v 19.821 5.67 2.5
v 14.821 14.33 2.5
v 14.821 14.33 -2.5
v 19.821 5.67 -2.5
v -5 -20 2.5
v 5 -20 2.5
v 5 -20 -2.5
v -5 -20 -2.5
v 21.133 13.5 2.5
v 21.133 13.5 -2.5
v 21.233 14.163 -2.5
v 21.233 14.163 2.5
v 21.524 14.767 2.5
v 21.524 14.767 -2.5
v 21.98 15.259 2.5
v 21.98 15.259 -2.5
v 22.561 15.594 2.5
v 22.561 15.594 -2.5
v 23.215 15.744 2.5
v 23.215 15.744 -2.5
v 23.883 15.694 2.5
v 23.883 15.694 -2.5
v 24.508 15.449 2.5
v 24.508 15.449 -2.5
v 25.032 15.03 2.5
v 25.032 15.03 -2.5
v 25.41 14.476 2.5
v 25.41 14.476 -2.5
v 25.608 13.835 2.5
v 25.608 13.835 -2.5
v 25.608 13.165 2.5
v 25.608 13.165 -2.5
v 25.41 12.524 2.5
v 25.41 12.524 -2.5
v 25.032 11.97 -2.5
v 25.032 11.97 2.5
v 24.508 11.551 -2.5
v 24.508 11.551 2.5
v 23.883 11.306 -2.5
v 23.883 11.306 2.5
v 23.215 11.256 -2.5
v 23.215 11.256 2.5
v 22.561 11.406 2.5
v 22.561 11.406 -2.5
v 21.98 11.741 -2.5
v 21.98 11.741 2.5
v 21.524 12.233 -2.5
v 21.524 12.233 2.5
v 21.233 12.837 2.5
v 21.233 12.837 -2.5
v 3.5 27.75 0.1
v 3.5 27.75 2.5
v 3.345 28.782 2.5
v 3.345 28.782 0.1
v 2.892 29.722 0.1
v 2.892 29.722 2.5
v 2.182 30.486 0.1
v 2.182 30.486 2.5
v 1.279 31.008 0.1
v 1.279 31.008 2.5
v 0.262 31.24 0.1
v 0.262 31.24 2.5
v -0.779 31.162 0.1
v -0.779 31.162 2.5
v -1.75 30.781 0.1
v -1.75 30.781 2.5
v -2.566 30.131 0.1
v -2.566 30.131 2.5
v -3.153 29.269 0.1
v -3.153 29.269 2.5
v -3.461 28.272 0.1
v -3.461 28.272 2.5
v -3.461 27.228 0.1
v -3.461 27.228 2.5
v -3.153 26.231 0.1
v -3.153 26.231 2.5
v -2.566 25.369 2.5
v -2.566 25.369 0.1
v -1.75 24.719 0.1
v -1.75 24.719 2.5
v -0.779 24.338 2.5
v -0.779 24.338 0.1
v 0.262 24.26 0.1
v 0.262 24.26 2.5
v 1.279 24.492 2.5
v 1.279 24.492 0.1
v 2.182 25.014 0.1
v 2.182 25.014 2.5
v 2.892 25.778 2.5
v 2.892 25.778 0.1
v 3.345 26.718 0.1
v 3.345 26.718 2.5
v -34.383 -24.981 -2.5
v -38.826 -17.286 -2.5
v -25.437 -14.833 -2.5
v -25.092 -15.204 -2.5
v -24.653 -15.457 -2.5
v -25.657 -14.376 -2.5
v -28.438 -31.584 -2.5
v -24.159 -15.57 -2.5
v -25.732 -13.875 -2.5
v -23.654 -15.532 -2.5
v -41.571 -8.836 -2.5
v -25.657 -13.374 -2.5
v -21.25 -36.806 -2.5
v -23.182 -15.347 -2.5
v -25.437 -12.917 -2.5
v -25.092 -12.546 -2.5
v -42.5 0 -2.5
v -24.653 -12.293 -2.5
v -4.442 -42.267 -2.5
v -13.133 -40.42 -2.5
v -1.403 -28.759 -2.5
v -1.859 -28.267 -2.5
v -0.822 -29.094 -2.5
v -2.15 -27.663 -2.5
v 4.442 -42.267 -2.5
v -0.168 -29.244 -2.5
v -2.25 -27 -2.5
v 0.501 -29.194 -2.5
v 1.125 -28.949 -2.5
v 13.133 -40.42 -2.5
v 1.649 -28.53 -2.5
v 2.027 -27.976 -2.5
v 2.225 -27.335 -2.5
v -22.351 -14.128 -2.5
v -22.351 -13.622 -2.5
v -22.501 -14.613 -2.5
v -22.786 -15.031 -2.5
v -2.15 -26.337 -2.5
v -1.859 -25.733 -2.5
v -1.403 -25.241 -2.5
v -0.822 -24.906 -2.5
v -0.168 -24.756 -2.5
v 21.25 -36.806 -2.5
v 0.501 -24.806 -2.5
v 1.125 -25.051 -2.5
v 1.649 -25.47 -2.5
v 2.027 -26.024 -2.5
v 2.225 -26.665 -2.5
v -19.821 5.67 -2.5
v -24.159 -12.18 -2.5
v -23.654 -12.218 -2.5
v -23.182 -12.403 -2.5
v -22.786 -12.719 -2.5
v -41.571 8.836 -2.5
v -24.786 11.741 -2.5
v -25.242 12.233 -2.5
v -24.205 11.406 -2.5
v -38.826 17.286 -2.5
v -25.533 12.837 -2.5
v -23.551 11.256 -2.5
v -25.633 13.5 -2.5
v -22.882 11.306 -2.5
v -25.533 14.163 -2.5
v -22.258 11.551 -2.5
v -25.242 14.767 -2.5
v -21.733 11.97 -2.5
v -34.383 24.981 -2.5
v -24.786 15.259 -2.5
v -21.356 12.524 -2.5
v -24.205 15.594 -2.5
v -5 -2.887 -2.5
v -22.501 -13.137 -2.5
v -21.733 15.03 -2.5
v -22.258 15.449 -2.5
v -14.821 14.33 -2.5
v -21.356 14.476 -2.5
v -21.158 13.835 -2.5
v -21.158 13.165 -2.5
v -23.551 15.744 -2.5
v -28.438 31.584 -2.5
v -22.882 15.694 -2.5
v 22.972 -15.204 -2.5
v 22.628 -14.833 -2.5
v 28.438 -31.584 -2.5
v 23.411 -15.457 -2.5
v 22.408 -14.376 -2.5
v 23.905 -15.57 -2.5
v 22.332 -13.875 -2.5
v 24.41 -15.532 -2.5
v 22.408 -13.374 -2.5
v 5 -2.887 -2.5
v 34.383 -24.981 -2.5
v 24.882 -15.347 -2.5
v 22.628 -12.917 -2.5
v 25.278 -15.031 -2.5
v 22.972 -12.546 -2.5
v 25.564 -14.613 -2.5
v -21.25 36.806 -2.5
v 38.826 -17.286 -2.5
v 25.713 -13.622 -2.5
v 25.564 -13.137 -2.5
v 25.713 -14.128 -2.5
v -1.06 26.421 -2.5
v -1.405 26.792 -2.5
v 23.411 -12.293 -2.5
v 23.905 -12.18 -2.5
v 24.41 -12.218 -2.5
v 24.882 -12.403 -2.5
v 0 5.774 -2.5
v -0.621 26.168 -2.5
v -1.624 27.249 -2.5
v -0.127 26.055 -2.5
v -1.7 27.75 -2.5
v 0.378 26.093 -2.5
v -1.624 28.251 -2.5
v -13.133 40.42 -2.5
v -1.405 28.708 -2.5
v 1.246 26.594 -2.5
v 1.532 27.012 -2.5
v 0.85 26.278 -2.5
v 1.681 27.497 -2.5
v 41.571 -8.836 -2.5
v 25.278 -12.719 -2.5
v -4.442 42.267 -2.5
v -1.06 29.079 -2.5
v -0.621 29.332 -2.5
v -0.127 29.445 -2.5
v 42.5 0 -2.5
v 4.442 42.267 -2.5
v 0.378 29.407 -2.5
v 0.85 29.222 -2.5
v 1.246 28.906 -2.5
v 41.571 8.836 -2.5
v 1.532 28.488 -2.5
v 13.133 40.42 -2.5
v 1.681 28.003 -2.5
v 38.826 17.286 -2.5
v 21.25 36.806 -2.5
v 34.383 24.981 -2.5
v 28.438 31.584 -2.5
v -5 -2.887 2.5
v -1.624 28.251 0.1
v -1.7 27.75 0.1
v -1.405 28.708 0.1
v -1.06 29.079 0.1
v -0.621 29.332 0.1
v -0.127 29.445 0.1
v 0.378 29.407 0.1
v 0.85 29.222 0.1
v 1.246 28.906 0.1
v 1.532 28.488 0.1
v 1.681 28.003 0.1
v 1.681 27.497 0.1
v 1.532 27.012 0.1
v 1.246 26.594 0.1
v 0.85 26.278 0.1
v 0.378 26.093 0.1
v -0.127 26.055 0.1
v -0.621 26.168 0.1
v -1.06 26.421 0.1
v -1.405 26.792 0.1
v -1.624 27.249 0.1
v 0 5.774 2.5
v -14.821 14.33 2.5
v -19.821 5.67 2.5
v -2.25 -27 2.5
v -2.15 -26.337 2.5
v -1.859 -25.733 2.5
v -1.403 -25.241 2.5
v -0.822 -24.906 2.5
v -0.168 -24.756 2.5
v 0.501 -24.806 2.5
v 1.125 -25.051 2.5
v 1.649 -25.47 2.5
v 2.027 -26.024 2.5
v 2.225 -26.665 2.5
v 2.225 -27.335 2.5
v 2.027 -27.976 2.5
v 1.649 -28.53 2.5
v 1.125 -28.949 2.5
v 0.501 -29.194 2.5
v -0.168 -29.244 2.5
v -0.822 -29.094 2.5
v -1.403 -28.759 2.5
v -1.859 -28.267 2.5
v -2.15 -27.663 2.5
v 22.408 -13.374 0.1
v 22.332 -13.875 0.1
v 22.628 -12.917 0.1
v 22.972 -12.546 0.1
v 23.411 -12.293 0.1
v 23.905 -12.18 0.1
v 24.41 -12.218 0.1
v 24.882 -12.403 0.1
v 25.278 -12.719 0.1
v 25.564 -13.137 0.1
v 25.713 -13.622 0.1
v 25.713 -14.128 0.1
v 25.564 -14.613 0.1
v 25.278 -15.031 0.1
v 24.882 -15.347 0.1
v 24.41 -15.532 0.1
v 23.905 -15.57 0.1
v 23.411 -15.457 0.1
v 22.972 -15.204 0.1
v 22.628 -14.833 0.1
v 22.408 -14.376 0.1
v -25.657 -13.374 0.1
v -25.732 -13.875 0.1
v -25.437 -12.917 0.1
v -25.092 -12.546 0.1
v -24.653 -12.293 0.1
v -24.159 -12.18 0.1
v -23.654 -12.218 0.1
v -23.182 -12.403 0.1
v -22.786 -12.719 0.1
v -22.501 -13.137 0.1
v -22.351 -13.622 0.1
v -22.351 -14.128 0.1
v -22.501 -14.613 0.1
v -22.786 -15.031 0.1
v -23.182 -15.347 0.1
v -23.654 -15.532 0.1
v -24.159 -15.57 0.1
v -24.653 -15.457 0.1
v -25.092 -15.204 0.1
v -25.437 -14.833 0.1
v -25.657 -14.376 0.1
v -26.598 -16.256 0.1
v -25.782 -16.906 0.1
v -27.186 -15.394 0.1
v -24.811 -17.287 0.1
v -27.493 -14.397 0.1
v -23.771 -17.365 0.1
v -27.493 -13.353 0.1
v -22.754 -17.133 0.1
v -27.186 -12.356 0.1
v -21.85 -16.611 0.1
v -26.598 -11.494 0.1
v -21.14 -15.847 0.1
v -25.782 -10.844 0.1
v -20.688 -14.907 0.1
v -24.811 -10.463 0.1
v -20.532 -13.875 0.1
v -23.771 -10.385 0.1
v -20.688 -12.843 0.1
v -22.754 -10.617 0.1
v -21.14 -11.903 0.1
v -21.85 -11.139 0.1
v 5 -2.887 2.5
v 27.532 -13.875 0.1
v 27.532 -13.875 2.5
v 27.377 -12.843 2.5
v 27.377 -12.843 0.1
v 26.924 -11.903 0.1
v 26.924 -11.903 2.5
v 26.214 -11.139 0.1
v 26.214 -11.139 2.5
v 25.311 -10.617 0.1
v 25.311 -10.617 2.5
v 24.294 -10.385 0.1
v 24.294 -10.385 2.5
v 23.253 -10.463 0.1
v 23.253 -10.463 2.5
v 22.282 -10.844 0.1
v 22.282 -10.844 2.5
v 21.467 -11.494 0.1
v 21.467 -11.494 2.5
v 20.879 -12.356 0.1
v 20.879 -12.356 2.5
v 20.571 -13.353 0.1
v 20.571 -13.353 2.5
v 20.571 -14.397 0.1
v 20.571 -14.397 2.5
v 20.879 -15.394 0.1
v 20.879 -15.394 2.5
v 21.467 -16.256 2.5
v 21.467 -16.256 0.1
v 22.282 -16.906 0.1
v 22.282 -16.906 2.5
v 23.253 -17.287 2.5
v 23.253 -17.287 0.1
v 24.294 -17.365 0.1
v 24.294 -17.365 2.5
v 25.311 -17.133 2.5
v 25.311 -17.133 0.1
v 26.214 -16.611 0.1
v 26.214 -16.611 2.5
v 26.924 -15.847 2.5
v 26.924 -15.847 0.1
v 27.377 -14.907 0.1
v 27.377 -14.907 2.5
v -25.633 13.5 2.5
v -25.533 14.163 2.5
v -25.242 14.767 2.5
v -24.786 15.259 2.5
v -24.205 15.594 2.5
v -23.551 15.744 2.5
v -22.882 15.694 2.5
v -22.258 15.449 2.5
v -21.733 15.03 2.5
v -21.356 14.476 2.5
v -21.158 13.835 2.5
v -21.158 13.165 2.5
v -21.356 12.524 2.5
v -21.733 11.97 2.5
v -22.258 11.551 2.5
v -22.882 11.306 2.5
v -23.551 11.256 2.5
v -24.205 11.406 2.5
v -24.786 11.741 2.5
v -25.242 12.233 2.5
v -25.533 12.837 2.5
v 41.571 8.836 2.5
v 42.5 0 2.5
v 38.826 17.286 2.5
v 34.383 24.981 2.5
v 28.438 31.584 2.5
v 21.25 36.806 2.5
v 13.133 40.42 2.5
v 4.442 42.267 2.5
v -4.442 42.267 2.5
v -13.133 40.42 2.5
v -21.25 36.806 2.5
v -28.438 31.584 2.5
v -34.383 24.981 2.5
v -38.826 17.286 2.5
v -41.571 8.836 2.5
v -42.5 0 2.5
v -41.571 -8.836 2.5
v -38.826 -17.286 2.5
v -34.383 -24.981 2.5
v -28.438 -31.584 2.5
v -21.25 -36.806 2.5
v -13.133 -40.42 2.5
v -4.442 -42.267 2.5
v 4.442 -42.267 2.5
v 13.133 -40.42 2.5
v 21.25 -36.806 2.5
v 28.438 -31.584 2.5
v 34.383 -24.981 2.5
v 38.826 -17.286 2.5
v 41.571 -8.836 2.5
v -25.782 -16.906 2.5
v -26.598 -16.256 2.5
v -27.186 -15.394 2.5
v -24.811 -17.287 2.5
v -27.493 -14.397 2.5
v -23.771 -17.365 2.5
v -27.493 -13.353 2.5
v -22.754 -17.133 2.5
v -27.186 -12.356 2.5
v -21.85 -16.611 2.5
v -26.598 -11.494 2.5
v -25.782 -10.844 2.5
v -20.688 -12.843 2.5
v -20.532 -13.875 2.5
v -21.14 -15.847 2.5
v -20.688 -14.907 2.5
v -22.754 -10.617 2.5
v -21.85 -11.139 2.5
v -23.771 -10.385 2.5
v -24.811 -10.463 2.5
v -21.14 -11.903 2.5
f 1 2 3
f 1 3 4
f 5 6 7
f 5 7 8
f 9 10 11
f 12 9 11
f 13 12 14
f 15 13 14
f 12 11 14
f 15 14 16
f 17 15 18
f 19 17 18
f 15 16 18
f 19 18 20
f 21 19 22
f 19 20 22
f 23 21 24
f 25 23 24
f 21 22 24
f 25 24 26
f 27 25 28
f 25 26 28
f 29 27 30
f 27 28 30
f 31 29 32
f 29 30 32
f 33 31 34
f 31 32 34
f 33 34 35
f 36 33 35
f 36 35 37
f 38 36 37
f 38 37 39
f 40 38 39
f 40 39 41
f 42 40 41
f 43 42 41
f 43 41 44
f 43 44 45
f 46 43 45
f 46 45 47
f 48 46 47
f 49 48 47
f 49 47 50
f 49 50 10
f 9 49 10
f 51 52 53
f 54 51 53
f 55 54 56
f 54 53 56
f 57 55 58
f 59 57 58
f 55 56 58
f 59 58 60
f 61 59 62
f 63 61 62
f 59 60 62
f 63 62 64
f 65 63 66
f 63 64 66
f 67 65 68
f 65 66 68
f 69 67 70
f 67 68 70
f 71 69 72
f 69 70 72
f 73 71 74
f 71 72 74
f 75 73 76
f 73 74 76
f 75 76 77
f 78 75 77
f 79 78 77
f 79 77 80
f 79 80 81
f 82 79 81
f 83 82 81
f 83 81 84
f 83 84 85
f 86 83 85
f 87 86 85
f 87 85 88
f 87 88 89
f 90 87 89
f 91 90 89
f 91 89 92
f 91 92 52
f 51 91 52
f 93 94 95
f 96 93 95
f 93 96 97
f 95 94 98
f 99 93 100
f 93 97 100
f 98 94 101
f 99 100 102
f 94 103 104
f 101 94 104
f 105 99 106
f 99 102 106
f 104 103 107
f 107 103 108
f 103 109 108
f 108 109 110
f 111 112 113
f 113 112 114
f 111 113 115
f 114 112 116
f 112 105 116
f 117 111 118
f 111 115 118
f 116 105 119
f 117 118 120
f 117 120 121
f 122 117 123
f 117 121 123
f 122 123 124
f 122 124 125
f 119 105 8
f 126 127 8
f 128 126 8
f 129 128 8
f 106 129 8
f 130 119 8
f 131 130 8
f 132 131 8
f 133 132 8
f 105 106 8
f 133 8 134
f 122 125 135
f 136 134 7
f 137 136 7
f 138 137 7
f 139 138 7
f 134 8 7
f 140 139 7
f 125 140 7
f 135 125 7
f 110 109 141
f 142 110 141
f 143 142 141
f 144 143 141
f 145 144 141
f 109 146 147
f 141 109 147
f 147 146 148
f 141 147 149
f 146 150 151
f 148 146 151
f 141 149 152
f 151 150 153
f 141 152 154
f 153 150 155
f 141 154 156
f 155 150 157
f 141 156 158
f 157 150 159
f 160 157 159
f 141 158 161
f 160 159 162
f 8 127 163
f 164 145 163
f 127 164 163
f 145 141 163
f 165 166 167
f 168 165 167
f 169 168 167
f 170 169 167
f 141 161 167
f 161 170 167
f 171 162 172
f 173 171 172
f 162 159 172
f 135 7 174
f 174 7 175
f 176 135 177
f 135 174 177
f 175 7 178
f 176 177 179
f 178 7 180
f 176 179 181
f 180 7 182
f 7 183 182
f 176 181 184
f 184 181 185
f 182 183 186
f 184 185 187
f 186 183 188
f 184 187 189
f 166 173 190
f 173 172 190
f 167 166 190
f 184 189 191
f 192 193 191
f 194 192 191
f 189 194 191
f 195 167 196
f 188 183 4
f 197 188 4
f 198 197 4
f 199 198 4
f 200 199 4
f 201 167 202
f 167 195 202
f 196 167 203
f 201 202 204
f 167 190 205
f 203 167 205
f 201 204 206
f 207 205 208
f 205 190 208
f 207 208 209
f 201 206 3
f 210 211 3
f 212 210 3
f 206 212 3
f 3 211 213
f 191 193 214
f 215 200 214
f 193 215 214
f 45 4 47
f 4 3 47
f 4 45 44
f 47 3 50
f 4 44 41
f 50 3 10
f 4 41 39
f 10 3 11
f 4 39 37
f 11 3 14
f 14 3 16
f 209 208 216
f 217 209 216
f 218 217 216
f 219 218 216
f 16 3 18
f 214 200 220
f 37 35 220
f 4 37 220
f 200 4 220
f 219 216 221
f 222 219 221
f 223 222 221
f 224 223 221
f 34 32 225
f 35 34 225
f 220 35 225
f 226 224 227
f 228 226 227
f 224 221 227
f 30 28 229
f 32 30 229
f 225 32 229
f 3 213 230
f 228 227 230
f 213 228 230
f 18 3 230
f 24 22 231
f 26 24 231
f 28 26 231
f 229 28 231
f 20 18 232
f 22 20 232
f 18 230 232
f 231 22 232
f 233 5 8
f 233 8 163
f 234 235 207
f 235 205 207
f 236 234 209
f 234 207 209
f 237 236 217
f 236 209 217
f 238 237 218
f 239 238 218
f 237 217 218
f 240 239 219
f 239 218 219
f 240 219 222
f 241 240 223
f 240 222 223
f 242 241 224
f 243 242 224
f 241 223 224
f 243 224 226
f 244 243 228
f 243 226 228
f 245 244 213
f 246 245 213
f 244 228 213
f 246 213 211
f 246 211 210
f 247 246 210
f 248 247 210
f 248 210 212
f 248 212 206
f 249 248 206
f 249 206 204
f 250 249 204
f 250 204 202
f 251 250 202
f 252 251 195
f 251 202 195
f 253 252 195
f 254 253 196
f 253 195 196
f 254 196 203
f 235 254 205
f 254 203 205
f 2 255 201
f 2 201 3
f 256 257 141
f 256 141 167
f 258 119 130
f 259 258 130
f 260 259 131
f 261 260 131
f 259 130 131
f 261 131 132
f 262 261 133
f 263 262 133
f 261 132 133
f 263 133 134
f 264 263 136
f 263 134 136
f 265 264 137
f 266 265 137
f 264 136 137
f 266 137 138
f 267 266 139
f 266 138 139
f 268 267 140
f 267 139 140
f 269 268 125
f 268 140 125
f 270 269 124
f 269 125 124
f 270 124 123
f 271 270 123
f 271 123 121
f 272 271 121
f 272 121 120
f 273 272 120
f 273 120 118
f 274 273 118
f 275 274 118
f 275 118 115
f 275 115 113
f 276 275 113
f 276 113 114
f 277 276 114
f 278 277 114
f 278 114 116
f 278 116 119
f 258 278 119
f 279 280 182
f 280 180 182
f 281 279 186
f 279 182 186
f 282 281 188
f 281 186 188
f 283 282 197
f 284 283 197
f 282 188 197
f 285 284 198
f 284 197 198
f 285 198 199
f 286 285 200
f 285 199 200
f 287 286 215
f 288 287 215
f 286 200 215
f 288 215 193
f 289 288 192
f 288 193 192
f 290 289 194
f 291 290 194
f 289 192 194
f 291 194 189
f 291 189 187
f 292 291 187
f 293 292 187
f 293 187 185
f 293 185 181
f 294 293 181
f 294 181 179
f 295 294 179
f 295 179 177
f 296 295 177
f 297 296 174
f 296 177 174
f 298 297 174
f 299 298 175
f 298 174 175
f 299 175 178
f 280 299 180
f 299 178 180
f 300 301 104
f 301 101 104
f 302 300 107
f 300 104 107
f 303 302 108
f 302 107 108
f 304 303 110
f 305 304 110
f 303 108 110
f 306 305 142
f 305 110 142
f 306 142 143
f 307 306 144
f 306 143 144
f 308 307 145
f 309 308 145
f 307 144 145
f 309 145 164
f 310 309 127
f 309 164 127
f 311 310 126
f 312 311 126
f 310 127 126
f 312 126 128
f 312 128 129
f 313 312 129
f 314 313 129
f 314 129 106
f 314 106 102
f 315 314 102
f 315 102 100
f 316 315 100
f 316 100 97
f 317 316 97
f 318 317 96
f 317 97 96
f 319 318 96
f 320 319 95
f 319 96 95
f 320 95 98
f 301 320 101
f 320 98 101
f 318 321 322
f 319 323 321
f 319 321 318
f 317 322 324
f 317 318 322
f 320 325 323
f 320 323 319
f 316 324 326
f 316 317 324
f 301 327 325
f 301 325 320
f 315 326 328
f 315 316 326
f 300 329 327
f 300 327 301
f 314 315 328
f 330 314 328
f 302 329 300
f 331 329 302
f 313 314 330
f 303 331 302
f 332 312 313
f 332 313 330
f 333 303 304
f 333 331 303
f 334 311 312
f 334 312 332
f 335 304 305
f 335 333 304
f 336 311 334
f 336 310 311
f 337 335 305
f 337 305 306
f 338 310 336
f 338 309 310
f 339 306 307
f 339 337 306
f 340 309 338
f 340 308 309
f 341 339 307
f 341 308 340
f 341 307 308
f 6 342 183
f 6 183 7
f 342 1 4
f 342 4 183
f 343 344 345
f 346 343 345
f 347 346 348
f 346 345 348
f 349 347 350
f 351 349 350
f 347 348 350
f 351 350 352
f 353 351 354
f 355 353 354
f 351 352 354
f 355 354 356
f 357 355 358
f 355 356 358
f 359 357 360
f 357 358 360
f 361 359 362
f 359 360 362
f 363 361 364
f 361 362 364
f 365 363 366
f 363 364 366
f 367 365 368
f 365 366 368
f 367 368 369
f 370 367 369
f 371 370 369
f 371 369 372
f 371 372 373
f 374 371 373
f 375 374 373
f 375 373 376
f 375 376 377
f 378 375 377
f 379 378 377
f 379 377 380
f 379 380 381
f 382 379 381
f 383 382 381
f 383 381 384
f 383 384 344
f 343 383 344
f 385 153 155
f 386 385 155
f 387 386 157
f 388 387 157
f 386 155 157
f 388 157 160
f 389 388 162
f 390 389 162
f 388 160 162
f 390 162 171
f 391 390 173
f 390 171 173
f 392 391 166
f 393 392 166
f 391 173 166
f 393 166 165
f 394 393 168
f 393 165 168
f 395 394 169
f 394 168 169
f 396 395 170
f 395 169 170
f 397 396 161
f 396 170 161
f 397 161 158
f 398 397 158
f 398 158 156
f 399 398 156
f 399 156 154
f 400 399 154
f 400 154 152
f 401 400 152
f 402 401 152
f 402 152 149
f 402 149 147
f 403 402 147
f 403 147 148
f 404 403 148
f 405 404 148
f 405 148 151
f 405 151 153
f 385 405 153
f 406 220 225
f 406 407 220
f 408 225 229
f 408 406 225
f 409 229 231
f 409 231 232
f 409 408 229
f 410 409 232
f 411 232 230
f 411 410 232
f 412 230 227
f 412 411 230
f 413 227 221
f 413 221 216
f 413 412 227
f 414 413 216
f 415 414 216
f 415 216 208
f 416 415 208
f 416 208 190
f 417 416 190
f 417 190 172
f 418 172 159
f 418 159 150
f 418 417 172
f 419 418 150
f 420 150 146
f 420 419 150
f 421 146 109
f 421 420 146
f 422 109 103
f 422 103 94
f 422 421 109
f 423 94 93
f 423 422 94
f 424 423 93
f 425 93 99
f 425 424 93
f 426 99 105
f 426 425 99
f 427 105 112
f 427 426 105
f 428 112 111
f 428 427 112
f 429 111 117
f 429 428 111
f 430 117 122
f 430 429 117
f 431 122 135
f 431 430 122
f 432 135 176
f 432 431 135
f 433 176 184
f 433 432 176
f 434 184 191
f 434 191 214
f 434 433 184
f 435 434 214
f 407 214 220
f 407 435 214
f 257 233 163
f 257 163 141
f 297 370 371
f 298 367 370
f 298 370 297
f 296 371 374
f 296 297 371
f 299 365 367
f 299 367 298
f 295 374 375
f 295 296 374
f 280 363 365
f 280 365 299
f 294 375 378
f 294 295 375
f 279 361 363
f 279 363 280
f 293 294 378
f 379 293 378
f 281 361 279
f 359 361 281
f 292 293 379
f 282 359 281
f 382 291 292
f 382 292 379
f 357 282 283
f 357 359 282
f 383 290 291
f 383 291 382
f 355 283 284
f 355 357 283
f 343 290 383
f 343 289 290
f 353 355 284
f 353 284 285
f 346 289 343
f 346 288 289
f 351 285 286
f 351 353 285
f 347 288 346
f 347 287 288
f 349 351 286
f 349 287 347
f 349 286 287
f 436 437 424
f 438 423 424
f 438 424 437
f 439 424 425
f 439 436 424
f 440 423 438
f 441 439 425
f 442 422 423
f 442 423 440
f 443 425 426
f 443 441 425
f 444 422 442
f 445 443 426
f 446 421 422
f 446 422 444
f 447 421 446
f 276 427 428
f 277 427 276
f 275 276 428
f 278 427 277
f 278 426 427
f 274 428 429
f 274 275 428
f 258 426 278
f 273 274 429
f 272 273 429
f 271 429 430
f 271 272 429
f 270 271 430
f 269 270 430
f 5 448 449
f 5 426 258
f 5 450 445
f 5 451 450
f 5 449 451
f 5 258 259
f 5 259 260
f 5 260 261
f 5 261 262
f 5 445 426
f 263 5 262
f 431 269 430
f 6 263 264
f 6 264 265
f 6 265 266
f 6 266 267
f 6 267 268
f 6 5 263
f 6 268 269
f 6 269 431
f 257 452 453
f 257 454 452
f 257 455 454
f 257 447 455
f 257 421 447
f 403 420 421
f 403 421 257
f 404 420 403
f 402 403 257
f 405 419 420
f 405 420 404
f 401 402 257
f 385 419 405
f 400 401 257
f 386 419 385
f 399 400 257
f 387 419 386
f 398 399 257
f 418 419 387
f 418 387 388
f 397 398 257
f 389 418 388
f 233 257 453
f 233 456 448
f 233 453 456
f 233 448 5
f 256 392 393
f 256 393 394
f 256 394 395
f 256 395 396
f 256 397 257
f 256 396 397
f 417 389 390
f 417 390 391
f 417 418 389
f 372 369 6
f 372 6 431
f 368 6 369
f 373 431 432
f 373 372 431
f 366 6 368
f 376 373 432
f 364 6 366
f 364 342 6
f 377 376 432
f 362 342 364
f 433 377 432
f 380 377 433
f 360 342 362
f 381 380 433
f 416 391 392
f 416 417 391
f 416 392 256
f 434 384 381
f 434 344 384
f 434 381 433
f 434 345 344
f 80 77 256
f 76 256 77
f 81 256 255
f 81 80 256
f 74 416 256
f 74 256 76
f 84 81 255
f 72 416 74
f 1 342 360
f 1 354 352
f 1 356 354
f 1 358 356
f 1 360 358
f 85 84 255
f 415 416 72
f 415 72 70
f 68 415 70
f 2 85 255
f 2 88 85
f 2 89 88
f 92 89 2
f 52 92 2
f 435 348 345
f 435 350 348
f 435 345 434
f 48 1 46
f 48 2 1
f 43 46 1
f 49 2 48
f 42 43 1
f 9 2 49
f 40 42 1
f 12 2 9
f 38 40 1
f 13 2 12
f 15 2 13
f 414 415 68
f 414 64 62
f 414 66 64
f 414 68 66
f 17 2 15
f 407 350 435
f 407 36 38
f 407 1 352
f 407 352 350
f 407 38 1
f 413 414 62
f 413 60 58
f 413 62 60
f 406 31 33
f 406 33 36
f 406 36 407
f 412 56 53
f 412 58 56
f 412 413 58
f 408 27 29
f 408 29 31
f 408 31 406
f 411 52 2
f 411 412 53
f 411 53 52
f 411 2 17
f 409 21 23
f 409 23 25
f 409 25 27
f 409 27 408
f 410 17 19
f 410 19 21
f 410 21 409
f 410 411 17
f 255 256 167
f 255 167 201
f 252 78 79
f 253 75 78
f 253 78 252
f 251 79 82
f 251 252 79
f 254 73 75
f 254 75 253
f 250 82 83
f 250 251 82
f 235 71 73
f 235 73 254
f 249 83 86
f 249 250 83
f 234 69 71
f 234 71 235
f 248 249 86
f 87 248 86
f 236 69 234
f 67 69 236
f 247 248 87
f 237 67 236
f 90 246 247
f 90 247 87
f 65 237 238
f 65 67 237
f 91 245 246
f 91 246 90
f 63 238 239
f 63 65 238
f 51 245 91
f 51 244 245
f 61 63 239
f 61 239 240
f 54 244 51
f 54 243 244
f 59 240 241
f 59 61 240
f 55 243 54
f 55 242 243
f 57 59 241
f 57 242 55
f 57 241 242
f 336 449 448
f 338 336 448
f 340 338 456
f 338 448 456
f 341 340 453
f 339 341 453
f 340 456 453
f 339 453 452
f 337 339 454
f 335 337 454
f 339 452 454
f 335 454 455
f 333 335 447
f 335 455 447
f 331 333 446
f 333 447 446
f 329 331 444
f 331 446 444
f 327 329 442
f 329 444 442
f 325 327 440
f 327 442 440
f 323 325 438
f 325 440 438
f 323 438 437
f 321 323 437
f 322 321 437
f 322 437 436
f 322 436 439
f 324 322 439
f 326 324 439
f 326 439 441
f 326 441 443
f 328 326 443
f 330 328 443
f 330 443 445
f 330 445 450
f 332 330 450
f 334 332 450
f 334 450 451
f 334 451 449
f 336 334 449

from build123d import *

# Parameters (mm, degrees)
CROQUIS1_R                                           = 42.5
SALIENTE_EXTRUIR1_DEPTH                              = 2.5
REFRENTADO_PARA_TORNILLO_CON_CABEZA_TRON_D           = 3.4
REFRENTADO_PARA_TORNILLO_CON_CABEZA_TRON_CBORE_D     = 7
REFRENTADO_PARA_TORNILLO_CON_CABEZA_TRON_CBORE_DEPTH = 2.4
TALADRO_DE_MARGEN_PARA_M41_D                         = 4.5
CORTAR_EXTRUIR1_REACH                                = 62.312


with BuildPart() as part:
    # Croquis1 → Saliente-Extruir1 (new, symmetric)
    with BuildSketch(Plane.XY):
        Circle(CROQUIS1_R)
    extrude(amount=SALIENTE_EXTRUIR1_DEPTH, both=True)

    # Refrentado para tornillo con cabeza troncocónica de M31 (through all)
    with Locations(Plane.XY.offset(2.5)):
        with Locations((0, 27.75), (24.032204955, -13.875), (-24.032204955, -13.875)):
            CounterBoreHole(REFRENTADO_PARA_TORNILLO_CON_CABEZA_TRON_D / 2, REFRENTADO_PARA_TORNILLO_CON_CABEZA_TRON_CBORE_D / 2, REFRENTADO_PARA_TORNILLO_CON_CABEZA_TRON_CBORE_DEPTH)

    # Taladro de margen para M41 (through all)
    with Locations(Plane.XY.offset(2.5)):
        with Locations((0, -27), (-23.382685902, 13.5), (23.382685902, 13.5)):
            Hole(TALADRO_DE_MARGEN_PARA_M41_D / 2)

    # Croquis8 → Cortar-Extruir1 (cut, up to next)
    with BuildSketch(Plane.XY.offset(2.5), mode=Mode.PRIVATE) as cortar_extruir1_sk1:
        Polygon((-14.820508076, 14.330127019), (0, 5.773502692), (14.820508076, 14.330127019), (19.820508076, 5.669872981), (5, -2.886751346), (5, -20), (-5, -20), (-5, -2.886751346), (-19.820508076, 5.669872981), align=None)
    cortar_extruir1_tool1 = extrude(cortar_extruir1_sk1.sketch, amount=-CORTAR_EXTRUIR1_REACH, mode=Mode.PRIVATE) & part.part
    add(cortar_extruir1_tool1.solids().sort_by_distance((0, 0, 2.5))[0], mode=Mode.SUBTRACT)


solid = part.part
